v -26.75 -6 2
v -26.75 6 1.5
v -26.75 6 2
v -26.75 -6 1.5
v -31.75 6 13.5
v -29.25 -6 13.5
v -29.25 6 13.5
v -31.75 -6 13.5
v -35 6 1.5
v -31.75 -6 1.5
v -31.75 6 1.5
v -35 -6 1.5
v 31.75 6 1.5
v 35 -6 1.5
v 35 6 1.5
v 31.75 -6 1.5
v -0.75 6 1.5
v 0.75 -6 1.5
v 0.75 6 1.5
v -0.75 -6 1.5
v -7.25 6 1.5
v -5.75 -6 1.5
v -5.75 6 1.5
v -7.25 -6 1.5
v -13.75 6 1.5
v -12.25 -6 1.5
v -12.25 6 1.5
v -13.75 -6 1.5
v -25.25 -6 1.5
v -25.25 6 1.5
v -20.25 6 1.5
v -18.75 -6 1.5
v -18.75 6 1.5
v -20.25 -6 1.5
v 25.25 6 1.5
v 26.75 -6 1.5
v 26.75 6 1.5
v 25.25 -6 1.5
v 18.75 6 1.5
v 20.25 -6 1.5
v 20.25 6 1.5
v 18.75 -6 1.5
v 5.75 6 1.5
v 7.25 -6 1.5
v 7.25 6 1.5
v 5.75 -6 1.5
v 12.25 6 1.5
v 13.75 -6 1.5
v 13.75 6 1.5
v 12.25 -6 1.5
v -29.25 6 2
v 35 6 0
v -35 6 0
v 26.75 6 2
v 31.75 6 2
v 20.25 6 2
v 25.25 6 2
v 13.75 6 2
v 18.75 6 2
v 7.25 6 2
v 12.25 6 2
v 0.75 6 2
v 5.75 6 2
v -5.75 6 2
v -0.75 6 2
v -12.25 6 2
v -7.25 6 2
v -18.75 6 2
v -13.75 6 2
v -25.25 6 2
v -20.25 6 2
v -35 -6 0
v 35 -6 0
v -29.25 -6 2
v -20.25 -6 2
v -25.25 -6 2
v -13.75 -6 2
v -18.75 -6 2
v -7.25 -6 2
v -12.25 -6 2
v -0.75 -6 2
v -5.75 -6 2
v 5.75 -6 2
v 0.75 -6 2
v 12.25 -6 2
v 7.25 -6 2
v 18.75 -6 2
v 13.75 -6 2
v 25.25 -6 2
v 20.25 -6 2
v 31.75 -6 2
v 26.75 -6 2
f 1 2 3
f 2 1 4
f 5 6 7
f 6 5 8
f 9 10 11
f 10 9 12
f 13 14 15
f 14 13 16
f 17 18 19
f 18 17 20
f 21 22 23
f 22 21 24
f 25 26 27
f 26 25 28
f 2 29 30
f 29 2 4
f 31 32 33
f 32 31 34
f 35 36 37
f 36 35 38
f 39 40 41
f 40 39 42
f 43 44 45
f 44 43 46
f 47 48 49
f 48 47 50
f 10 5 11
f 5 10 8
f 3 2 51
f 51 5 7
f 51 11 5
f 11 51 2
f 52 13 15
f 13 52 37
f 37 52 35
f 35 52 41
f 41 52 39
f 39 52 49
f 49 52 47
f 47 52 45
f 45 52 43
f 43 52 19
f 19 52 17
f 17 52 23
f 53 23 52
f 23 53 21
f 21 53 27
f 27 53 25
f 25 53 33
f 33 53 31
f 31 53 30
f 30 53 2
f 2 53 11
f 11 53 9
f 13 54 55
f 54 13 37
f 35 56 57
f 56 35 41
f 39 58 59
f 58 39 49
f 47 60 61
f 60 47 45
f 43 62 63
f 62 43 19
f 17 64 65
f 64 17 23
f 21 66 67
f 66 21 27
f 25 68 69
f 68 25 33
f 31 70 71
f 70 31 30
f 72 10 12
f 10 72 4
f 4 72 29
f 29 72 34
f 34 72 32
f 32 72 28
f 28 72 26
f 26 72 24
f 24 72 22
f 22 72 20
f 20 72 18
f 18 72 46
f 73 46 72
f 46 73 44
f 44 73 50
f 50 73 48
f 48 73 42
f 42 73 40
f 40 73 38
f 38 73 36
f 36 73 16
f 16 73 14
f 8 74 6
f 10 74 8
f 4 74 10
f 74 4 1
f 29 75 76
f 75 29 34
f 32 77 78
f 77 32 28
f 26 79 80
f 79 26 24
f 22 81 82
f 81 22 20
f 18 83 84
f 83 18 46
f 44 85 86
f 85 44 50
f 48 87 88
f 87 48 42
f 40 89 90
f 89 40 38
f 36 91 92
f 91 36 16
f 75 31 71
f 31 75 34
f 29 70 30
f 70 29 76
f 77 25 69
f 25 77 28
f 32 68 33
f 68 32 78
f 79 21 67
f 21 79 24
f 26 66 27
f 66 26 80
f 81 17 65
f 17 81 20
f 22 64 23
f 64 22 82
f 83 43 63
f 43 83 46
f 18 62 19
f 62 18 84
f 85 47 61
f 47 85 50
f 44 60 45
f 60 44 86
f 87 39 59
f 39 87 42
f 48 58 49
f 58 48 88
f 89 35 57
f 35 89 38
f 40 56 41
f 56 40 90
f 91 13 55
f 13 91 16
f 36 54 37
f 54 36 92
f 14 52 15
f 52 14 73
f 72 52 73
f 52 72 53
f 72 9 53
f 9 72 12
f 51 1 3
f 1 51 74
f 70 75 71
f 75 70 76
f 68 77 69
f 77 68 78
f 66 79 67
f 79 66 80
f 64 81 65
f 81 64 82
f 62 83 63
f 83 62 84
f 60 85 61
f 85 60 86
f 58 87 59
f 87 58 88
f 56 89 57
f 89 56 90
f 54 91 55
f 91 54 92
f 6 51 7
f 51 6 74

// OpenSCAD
// 10-well comb for casting agarose gels
// Print orientation: flat on bed, teeth pointing up (+Z)

// ---------- Parameters ----------
plate_t      = 1.5;   // plate thickness (Z)
spine_len    = 70;    // spine length (X)
spine_w      = 12;    // spine width (Y)
tooth_count  = 10;    // number of teeth
tooth_w      = 5.0;   // tooth width (X)
tooth_len    = 12;    // tooth length (Y)
tooth_h      = 12;    // tooth height from plate top (Z)
gap          = 1.5;   // gap between teeth (X)
eps          = 0.5;   // cutter overshoot past faces

$fn = 64;

// ---------- Derived ----------
pitch      = tooth_w + gap;
x_start    = -(tooth_count - 1) * pitch / 2;   // first tooth centre (X)
reach      = max(spine_w / 2 + eps, tooth_len + eps); // cutter reach from origin (Y)

// ---------- Model ----------
difference() {
    union() {
        // Plate with spine
        translate([-spine_len / 2, -spine_w / 2, 0])
            cube([spine_len, spine_w, plate_t]);

        // Teeth (overhang beyond plate top)
        for (i = [0 : tooth_count - 1])
            translate([x_start + i * pitch - tooth_w / 2,
                       -tooth_len / 2, plate_t])
                cube([tooth_w, tooth_len, tooth_h]);
    }

    // Cutout: row of teeth in -Y from the plate top edge
    translate([x_start, -tooth_len / 2, plate_t + eps])
        cube([tooth_count * pitch, tooth_len, reach]);
}
